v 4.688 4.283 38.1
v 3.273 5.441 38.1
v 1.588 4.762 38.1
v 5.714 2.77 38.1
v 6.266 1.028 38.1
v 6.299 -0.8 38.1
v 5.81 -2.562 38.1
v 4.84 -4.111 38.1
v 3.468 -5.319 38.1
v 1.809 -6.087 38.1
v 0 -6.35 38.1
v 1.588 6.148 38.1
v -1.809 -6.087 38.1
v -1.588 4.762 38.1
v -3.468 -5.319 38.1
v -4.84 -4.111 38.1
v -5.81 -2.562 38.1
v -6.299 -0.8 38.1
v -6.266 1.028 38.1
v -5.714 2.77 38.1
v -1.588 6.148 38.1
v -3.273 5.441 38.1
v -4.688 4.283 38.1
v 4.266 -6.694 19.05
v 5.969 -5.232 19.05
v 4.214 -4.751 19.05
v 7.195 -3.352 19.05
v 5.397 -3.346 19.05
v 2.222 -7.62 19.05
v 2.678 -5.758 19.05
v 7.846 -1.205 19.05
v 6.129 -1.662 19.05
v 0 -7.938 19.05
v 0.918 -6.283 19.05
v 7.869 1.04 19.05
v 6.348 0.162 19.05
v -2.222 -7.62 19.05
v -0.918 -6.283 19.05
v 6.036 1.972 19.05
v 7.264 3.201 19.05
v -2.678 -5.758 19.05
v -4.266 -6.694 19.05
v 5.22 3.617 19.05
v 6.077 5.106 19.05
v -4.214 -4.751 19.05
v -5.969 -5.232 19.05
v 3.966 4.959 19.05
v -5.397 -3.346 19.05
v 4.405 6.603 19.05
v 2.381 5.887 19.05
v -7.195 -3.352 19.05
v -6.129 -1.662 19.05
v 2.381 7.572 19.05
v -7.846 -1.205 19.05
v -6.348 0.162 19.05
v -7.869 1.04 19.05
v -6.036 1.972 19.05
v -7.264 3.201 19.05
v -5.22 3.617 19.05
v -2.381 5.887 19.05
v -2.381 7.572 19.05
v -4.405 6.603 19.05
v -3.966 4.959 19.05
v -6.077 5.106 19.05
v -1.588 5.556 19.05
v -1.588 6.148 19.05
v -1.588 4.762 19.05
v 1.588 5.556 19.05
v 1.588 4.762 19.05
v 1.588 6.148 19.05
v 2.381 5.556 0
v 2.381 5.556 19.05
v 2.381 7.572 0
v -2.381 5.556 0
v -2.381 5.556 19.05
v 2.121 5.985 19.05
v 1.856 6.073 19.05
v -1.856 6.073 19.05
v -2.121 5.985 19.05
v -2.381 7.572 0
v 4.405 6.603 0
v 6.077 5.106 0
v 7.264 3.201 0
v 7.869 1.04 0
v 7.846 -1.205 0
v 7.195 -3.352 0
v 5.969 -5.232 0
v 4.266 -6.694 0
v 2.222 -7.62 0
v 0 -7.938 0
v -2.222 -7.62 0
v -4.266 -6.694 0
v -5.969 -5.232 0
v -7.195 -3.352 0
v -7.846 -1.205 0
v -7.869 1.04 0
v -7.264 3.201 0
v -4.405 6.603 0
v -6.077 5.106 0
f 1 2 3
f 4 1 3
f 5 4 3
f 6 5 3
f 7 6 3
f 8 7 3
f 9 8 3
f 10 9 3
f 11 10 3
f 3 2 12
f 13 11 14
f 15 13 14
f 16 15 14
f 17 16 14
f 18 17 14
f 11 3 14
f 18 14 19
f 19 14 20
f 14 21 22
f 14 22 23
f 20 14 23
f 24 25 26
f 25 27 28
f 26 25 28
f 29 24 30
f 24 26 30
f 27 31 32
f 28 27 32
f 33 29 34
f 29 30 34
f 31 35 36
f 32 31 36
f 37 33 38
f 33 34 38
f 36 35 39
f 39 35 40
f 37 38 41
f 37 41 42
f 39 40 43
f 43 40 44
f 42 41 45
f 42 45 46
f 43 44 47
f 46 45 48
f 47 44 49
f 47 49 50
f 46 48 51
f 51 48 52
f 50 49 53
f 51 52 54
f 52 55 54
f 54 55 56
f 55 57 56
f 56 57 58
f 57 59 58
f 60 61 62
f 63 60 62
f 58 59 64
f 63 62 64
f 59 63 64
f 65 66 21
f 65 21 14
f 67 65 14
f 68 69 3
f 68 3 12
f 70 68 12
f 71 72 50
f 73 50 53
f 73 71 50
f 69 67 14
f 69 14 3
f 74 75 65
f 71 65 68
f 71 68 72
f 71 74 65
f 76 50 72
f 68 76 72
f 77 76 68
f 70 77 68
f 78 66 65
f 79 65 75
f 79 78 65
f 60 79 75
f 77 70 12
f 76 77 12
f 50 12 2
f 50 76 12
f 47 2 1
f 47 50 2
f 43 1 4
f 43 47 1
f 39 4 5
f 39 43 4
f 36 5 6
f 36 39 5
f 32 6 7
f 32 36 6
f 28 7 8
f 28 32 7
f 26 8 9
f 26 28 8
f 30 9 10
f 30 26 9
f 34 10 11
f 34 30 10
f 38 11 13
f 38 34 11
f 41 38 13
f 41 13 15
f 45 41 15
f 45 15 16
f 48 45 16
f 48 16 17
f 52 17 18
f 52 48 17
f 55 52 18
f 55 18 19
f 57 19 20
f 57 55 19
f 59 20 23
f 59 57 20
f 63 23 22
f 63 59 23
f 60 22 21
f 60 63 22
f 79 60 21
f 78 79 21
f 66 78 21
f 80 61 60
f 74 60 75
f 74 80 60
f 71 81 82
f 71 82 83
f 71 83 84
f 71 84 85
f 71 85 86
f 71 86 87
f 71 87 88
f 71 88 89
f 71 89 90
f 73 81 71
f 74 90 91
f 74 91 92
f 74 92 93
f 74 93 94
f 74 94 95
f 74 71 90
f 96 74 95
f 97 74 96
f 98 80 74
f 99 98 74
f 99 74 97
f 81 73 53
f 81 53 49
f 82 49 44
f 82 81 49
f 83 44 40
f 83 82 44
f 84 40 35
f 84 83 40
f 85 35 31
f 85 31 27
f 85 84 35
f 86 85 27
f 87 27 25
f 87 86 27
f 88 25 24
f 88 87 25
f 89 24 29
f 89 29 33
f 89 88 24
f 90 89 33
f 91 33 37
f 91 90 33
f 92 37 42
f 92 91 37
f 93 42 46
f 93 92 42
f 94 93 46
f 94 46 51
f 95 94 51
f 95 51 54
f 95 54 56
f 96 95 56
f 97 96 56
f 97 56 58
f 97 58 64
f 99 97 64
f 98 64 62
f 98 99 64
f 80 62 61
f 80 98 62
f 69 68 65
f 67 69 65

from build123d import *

# Parameters (mm, degrees)
BOSS_EXTRUDE1_DEPTH = 19.05
BOSS_EXTRUDE2_DEPTH = 19.05


with BuildPart() as part:
    # Sketch1 → Boss-Extrude1 (new body)
    with BuildSketch(Plane.XY):
        with BuildLine():
            Line((-2.38125, 7.571892411), (-2.38125, 5.55625))
            Line((-2.38125, 5.55625), (2.38125, 5.55625))
            Line((2.38125, 5.55625), (2.38125, 7.571892411))
            ThreePointArc((2.38125, 7.571892411), (0, -7.9375), (-2.38125, 7.571892411))
        make_face()
    extrude(amount=BOSS_EXTRUDE1_DEPTH)

    # Sketch2 → Boss-Extrude2 (add)
    with BuildSketch(Plane.XY.offset(19.05)):
        with BuildLine():
            Line((-1.5875, 6.148361062), (-1.5875, 4.7625))
            Line((-1.5875, 4.7625), (1.5875, 4.7625))
            Line((1.5875, 4.7625), (1.5875, 6.148361062))
            ThreePointArc((1.5875, 6.148361062), (0, -6.35), (-1.5875, 6.148361062))
        make_face()
    extrude(amount=BOSS_EXTRUDE2_DEPTH)


solid = part.part
